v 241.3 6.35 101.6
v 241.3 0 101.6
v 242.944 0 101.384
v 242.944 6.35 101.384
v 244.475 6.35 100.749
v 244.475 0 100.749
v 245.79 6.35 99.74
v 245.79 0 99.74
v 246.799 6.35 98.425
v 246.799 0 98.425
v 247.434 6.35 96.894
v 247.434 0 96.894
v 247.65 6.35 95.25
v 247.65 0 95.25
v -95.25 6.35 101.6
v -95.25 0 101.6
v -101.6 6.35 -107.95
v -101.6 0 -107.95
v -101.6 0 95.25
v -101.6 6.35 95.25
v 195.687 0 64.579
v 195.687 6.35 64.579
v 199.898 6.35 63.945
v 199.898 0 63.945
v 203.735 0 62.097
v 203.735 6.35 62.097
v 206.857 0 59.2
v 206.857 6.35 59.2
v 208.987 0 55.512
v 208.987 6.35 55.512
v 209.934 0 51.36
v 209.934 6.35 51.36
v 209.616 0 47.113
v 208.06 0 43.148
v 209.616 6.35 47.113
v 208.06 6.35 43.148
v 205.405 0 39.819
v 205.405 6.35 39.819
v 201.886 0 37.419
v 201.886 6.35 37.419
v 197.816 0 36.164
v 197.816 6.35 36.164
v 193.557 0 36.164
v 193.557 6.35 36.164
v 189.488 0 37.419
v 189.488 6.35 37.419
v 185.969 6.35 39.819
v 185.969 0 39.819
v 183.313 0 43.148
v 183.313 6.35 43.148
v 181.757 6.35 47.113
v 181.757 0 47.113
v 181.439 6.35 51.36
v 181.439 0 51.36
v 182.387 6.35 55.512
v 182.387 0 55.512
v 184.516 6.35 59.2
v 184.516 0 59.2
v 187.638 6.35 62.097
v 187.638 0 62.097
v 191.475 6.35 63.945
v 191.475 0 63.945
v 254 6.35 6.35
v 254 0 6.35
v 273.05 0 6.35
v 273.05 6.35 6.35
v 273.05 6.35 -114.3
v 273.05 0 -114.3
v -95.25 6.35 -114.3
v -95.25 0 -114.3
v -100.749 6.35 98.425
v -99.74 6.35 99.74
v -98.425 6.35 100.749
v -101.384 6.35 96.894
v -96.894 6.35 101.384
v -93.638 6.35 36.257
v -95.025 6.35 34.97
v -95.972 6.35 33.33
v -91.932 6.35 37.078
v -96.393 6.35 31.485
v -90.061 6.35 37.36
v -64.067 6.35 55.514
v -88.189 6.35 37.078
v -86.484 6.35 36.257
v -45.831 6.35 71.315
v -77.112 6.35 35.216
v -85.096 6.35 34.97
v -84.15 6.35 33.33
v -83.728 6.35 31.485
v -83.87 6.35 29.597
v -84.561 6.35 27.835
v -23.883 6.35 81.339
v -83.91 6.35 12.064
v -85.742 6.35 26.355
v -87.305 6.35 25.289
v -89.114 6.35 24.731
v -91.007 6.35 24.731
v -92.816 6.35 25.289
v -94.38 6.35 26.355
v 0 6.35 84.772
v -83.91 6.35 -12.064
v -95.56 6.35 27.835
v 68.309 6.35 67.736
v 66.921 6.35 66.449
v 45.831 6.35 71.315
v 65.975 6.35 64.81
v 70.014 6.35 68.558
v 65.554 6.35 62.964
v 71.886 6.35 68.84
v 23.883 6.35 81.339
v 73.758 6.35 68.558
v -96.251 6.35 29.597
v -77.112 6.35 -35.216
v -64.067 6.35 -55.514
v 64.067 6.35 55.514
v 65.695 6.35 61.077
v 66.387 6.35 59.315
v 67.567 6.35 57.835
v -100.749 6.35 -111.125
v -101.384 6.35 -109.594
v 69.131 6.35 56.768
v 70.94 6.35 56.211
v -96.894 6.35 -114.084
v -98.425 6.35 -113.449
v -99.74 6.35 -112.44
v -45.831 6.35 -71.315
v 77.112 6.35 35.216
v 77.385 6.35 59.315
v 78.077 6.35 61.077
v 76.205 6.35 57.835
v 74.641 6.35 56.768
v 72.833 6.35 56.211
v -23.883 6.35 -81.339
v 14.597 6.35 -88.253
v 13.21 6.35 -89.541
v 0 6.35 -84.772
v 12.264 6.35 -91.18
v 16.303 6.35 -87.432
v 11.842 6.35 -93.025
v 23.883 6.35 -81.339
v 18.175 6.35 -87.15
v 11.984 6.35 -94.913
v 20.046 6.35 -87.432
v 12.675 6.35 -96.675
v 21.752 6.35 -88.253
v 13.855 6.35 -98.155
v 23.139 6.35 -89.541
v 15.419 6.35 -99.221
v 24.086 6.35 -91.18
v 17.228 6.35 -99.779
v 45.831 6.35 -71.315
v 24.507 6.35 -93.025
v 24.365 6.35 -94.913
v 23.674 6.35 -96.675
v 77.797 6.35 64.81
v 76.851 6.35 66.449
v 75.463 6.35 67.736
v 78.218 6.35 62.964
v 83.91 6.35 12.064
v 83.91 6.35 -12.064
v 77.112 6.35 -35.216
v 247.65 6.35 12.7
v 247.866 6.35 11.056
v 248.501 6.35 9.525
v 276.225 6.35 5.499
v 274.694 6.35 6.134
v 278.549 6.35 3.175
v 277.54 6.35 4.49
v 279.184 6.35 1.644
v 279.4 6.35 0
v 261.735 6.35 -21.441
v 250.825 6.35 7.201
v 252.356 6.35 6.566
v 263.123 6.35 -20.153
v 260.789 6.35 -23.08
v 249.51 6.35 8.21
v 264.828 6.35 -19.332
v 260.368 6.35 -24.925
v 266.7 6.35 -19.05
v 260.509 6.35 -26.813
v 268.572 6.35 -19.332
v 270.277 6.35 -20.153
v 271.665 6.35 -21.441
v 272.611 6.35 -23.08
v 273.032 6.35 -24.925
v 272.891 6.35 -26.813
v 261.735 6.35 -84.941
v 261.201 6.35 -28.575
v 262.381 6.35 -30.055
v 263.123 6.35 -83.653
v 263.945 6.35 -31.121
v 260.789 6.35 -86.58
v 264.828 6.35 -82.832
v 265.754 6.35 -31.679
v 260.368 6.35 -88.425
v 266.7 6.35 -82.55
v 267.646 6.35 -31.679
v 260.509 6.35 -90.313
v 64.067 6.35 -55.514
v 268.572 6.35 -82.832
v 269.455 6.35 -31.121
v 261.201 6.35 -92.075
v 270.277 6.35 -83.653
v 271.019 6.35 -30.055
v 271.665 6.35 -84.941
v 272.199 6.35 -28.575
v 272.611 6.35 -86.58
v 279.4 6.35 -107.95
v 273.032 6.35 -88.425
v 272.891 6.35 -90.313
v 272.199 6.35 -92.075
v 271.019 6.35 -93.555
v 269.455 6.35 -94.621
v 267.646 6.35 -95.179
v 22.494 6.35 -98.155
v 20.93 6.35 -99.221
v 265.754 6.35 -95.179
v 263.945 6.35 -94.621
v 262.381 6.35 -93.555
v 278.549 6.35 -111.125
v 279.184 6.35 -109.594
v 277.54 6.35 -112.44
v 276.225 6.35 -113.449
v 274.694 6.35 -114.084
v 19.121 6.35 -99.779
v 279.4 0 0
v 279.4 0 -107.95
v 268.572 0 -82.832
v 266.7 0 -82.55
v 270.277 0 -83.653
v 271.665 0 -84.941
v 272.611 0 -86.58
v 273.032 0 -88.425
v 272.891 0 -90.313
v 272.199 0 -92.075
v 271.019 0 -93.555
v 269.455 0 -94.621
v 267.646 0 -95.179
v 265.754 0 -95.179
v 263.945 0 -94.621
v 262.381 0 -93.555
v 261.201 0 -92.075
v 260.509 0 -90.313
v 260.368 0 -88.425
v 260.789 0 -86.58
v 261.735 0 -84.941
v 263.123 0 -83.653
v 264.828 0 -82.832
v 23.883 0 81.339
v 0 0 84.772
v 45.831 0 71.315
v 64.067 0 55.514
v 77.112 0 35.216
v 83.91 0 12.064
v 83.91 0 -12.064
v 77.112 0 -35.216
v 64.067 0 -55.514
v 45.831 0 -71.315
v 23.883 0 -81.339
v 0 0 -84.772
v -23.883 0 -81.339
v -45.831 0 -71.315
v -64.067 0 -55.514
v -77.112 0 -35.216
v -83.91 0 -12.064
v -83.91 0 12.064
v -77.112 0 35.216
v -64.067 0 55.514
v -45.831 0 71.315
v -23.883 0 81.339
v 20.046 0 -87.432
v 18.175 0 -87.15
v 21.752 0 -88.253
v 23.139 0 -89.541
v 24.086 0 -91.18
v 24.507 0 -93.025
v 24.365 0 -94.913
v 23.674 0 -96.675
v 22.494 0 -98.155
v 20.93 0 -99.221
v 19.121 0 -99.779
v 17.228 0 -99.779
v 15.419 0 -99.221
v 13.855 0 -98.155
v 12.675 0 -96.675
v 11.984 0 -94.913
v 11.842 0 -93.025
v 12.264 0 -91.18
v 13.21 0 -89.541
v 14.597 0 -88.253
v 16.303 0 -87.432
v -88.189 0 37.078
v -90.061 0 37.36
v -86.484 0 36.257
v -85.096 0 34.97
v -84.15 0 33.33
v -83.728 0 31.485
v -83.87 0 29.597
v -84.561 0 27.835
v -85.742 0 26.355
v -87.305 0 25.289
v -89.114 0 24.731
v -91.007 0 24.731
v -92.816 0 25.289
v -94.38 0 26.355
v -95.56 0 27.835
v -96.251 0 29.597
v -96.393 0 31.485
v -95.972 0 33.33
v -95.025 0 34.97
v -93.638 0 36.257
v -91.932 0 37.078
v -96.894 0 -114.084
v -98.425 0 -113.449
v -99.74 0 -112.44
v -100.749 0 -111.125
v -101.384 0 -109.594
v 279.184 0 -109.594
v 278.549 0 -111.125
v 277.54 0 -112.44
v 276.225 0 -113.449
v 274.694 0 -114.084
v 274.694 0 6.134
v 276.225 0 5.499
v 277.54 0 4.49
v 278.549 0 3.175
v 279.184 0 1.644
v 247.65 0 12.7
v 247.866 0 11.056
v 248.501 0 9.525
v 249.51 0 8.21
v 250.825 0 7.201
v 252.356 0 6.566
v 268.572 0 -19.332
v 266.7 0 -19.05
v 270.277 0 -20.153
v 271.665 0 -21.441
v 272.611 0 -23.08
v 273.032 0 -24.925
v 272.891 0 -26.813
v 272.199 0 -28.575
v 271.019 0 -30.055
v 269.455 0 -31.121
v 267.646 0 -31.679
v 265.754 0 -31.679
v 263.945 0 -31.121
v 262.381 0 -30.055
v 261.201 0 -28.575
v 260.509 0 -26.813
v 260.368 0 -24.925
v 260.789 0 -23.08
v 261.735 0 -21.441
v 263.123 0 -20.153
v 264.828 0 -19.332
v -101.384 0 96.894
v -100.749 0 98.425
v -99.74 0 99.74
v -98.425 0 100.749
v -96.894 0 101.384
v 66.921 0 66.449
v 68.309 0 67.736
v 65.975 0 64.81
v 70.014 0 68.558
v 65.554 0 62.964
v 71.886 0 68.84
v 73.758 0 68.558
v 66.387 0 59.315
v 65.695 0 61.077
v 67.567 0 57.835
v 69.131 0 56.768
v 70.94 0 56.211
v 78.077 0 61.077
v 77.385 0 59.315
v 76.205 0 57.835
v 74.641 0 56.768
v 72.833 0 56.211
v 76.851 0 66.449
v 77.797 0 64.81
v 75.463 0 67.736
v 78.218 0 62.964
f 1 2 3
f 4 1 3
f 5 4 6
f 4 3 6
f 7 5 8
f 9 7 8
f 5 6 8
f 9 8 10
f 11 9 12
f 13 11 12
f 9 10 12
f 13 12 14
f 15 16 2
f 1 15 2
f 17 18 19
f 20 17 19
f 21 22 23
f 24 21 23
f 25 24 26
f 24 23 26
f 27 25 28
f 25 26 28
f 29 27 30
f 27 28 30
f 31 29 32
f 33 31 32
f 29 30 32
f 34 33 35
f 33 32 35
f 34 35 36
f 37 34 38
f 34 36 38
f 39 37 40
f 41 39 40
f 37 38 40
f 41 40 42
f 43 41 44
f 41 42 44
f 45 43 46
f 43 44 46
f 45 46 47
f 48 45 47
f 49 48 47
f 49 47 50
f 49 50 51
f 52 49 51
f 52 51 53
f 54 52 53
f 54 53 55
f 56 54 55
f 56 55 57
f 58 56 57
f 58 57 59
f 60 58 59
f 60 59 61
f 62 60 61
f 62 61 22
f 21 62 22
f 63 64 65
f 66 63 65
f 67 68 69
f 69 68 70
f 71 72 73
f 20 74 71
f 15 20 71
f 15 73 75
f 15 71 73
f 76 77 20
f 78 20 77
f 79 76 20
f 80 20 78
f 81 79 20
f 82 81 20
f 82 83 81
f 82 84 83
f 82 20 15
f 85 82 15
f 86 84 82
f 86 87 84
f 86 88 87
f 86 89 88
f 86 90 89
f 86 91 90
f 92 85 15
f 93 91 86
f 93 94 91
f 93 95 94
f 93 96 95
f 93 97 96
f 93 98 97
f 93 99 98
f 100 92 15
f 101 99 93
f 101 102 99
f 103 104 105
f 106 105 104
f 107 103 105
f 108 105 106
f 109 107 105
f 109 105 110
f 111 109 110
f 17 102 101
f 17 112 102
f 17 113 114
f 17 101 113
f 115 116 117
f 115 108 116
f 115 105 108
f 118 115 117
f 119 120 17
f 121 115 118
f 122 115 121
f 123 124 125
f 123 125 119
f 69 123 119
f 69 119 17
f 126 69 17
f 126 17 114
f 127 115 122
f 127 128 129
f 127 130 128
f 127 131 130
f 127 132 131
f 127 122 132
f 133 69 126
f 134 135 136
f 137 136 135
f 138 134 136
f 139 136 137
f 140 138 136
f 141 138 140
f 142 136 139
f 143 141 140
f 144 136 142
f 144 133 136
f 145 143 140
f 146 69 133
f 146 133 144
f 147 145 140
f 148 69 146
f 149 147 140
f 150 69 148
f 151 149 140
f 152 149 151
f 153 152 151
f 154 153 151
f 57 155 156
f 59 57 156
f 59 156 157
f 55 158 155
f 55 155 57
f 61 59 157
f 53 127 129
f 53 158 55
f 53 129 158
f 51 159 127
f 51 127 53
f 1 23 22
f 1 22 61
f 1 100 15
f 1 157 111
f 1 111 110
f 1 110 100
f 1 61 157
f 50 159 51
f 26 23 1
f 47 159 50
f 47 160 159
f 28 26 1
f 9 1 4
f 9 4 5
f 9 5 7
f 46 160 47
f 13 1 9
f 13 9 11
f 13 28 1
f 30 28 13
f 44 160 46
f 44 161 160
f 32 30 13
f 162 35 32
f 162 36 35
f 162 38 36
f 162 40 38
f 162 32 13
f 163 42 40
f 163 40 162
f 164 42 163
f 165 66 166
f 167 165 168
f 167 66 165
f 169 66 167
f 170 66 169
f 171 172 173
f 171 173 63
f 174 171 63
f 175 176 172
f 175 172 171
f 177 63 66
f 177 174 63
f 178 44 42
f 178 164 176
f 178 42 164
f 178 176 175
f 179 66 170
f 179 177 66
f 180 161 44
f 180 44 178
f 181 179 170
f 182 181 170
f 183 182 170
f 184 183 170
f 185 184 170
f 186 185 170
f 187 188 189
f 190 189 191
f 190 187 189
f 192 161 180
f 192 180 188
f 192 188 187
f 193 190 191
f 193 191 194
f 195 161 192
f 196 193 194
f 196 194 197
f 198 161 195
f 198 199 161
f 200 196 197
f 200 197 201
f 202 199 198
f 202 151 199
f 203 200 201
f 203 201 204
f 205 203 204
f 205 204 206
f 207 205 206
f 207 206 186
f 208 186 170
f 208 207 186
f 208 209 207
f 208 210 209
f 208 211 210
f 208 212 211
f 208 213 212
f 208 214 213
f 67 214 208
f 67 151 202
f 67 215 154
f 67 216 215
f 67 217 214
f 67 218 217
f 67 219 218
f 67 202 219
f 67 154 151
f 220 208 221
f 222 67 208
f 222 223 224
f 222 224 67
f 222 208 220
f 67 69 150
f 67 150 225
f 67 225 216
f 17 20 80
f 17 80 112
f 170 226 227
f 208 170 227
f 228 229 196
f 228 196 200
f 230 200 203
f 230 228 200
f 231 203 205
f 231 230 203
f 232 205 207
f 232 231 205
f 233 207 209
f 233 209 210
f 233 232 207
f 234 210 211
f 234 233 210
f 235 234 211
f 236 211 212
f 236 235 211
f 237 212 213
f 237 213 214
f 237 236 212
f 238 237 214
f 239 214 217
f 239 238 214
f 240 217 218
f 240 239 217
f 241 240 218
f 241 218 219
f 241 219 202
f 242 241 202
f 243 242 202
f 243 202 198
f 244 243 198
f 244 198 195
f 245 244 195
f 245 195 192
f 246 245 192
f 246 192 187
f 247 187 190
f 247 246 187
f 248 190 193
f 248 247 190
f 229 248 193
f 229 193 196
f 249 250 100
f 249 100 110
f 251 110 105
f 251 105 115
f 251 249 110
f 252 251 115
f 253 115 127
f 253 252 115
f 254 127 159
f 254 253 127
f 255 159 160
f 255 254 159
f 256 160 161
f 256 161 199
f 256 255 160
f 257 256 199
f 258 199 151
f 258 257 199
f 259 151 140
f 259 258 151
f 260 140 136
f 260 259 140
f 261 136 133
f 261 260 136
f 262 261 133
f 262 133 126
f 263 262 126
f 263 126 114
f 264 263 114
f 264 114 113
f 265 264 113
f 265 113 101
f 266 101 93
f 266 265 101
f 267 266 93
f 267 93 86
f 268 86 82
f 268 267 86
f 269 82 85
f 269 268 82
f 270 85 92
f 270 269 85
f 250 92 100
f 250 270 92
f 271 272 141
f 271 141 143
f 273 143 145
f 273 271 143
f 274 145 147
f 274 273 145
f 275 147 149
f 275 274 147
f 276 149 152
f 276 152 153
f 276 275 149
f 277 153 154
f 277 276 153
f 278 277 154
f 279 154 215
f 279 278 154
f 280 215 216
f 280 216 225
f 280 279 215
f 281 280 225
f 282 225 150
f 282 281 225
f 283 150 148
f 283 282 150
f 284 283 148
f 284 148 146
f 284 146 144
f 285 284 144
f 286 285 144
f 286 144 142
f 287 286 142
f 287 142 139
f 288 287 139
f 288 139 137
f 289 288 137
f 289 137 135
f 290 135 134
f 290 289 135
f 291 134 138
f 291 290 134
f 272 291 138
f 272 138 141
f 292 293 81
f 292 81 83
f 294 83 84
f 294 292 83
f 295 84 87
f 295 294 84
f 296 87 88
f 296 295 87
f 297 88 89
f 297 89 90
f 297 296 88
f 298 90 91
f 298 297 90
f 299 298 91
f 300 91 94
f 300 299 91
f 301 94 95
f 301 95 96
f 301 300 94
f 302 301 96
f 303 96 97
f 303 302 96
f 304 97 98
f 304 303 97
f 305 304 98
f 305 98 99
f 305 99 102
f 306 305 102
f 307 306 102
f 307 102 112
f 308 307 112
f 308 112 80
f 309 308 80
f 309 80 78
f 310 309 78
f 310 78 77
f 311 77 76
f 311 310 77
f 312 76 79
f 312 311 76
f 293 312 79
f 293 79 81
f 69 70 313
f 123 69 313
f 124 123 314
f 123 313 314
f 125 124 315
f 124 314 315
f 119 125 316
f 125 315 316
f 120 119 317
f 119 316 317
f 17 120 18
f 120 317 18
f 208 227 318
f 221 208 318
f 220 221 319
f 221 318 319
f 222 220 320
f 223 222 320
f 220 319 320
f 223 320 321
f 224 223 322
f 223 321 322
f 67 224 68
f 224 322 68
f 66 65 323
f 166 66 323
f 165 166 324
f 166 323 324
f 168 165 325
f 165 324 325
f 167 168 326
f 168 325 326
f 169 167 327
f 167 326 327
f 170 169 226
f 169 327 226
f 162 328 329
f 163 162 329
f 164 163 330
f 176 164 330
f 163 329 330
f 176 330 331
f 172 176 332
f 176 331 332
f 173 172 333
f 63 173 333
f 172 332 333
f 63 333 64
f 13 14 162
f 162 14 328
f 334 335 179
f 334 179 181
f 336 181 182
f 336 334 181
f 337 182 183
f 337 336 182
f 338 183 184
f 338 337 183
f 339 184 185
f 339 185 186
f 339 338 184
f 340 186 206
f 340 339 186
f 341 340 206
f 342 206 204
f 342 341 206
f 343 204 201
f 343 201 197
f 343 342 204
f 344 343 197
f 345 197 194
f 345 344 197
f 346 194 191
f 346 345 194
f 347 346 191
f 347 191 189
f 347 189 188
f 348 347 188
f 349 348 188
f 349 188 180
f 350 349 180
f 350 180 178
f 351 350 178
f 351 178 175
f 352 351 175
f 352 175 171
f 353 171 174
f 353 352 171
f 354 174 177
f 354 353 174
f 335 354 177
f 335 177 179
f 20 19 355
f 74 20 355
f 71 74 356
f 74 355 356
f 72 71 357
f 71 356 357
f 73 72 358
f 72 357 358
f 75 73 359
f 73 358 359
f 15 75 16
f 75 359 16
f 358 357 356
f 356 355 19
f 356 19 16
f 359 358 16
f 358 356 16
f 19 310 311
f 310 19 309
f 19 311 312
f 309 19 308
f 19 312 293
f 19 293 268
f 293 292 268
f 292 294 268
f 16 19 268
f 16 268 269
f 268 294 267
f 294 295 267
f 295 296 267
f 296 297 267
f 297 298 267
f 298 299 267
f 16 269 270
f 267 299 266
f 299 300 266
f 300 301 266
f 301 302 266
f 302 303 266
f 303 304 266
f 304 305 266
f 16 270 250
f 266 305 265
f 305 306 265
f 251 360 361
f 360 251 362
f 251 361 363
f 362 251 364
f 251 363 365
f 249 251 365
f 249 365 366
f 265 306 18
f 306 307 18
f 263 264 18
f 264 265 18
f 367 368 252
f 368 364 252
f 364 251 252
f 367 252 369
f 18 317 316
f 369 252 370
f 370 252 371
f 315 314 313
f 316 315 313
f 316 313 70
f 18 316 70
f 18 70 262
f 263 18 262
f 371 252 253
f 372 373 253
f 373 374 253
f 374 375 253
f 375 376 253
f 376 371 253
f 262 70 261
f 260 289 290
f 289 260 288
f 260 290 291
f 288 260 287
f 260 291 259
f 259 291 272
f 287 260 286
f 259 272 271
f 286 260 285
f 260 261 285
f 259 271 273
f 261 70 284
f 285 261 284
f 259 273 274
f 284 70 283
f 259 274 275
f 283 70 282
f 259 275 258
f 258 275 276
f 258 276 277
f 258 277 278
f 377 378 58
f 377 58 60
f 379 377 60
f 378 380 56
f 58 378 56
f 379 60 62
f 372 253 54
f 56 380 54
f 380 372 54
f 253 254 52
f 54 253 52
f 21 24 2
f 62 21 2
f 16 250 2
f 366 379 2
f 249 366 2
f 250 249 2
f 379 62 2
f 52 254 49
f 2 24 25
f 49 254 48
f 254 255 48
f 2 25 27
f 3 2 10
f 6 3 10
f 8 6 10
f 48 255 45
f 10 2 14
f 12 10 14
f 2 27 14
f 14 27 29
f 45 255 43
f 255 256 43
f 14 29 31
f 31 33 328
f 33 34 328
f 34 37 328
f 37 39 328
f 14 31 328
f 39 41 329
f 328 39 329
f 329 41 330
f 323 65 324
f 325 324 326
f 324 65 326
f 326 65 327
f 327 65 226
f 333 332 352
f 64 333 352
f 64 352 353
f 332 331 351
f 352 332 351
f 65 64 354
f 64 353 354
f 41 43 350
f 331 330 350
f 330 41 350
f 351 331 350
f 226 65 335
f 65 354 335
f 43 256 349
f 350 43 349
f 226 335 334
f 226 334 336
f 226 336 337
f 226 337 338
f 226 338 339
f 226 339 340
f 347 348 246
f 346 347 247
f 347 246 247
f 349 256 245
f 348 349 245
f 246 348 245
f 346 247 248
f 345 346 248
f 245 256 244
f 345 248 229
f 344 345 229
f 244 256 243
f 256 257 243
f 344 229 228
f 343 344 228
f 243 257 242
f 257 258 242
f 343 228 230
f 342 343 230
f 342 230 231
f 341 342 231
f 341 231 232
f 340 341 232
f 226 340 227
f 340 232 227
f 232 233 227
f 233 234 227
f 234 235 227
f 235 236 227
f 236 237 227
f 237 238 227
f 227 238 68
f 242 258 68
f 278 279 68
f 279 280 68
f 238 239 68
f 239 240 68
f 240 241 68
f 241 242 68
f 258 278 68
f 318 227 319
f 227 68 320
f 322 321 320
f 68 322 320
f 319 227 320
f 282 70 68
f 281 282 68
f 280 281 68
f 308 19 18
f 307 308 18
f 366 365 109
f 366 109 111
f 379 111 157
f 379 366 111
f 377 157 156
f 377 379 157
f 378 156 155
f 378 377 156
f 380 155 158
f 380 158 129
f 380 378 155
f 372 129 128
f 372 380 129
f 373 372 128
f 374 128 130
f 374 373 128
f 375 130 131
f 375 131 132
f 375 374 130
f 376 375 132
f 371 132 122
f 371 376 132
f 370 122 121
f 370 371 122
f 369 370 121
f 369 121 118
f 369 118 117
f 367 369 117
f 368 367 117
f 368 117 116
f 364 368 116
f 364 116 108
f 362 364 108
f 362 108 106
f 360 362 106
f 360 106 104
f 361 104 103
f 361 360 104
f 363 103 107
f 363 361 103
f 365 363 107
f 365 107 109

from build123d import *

# Parameters (mm, degrees)
SKETCH1_R           = 84.7725
SKETCH1_R_2         = 6.35
BOSS_EXTRUDE1_DEPTH = 6.35
SKETCH4_R           = 14.2875
CUT_EXTRUDE1_DEPTH  = 9.652


with BuildPart() as part:
    # Sketch1 → Boss-Extrude1 (new body)
    with BuildSketch(Plane(origin=(0, 0, 0), x_dir=(1, 0, 0), z_dir=(0, 1, 0))):
        with BuildLine():
            Line((273.05, 114.3), (-95.25, 114.3))
            ThreePointArc((-95.25, 114.3), (-99.740128061, 112.440128061), (-101.6, 107.95))
            Line((-101.6, 107.95), (-101.6, -95.25))
            ThreePointArc((-101.6, -95.25), (-99.740128061, -99.740128061), (-95.25, -101.6))
            Line((-95.25, -101.6), (241.3, -101.6))
            ThreePointArc((241.3, -101.6), (245.790128061, -99.740128061), (247.65, -95.25))
            Line((247.65, -95.25), (247.65, -12.7))
            ThreePointArc((247.65, -12.7), (249.509871939, -8.209871939), (254, -6.35))
            Line((254, -6.35), (273.05, -6.35))
            ThreePointArc((273.05, -6.35), (277.540128061, -4.490128061), (279.4, 0))
            Line((279.4, 0), (279.4, 107.95))
            ThreePointArc((279.4, 107.95), (277.540128061, 112.440128061), (273.05, 114.3))
        make_face()
        with Locations(Location((0, 0, 0), (0, 0, 270))):
            Circle(SKETCH1_R, mode=Mode.SUBTRACT)
        with Locations(Location((-90.060644326, -31.010366712, 0), (0, 0, 270))):
            Circle(SKETCH1_R_2, mode=Mode.SUBTRACT)
        with Locations(Location((18.17455681, 93.499989223, 0), (0, 0, 270))):
            Circle(SKETCH1_R_2, mode=Mode.SUBTRACT)
        with Locations(Location((71.886087516, -62.489622511, 0), (0, 0, 270))):
            Circle(SKETCH1_R_2, mode=Mode.SUBTRACT)
        with Locations(Location((266.7, 88.9, 0), (0, 0, 270))):
            Circle(SKETCH1_R_2, mode=Mode.SUBTRACT)
        with Locations(Location((266.7, 25.4, 0), (0, 0, 270))):
            Circle(SKETCH1_R_2, mode=Mode.SUBTRACT)
    extrude(amount=BOSS_EXTRUDE1_DEPTH)

    # Sketch4 → Cut-Extrude1 (cut)
    with BuildSketch(Plane(origin=(0, 6.35, 0), x_dir=(1, 0, 0), z_dir=(0, 1, 0))):
        with Locations(Location((195.68668, -50.292, 0), (0, 0, 270))):
            Circle(SKETCH4_R)
    extrude(amount=-CUT_EXTRUDE1_DEPTH, mode=Mode.SUBTRACT)


solid = part.part
